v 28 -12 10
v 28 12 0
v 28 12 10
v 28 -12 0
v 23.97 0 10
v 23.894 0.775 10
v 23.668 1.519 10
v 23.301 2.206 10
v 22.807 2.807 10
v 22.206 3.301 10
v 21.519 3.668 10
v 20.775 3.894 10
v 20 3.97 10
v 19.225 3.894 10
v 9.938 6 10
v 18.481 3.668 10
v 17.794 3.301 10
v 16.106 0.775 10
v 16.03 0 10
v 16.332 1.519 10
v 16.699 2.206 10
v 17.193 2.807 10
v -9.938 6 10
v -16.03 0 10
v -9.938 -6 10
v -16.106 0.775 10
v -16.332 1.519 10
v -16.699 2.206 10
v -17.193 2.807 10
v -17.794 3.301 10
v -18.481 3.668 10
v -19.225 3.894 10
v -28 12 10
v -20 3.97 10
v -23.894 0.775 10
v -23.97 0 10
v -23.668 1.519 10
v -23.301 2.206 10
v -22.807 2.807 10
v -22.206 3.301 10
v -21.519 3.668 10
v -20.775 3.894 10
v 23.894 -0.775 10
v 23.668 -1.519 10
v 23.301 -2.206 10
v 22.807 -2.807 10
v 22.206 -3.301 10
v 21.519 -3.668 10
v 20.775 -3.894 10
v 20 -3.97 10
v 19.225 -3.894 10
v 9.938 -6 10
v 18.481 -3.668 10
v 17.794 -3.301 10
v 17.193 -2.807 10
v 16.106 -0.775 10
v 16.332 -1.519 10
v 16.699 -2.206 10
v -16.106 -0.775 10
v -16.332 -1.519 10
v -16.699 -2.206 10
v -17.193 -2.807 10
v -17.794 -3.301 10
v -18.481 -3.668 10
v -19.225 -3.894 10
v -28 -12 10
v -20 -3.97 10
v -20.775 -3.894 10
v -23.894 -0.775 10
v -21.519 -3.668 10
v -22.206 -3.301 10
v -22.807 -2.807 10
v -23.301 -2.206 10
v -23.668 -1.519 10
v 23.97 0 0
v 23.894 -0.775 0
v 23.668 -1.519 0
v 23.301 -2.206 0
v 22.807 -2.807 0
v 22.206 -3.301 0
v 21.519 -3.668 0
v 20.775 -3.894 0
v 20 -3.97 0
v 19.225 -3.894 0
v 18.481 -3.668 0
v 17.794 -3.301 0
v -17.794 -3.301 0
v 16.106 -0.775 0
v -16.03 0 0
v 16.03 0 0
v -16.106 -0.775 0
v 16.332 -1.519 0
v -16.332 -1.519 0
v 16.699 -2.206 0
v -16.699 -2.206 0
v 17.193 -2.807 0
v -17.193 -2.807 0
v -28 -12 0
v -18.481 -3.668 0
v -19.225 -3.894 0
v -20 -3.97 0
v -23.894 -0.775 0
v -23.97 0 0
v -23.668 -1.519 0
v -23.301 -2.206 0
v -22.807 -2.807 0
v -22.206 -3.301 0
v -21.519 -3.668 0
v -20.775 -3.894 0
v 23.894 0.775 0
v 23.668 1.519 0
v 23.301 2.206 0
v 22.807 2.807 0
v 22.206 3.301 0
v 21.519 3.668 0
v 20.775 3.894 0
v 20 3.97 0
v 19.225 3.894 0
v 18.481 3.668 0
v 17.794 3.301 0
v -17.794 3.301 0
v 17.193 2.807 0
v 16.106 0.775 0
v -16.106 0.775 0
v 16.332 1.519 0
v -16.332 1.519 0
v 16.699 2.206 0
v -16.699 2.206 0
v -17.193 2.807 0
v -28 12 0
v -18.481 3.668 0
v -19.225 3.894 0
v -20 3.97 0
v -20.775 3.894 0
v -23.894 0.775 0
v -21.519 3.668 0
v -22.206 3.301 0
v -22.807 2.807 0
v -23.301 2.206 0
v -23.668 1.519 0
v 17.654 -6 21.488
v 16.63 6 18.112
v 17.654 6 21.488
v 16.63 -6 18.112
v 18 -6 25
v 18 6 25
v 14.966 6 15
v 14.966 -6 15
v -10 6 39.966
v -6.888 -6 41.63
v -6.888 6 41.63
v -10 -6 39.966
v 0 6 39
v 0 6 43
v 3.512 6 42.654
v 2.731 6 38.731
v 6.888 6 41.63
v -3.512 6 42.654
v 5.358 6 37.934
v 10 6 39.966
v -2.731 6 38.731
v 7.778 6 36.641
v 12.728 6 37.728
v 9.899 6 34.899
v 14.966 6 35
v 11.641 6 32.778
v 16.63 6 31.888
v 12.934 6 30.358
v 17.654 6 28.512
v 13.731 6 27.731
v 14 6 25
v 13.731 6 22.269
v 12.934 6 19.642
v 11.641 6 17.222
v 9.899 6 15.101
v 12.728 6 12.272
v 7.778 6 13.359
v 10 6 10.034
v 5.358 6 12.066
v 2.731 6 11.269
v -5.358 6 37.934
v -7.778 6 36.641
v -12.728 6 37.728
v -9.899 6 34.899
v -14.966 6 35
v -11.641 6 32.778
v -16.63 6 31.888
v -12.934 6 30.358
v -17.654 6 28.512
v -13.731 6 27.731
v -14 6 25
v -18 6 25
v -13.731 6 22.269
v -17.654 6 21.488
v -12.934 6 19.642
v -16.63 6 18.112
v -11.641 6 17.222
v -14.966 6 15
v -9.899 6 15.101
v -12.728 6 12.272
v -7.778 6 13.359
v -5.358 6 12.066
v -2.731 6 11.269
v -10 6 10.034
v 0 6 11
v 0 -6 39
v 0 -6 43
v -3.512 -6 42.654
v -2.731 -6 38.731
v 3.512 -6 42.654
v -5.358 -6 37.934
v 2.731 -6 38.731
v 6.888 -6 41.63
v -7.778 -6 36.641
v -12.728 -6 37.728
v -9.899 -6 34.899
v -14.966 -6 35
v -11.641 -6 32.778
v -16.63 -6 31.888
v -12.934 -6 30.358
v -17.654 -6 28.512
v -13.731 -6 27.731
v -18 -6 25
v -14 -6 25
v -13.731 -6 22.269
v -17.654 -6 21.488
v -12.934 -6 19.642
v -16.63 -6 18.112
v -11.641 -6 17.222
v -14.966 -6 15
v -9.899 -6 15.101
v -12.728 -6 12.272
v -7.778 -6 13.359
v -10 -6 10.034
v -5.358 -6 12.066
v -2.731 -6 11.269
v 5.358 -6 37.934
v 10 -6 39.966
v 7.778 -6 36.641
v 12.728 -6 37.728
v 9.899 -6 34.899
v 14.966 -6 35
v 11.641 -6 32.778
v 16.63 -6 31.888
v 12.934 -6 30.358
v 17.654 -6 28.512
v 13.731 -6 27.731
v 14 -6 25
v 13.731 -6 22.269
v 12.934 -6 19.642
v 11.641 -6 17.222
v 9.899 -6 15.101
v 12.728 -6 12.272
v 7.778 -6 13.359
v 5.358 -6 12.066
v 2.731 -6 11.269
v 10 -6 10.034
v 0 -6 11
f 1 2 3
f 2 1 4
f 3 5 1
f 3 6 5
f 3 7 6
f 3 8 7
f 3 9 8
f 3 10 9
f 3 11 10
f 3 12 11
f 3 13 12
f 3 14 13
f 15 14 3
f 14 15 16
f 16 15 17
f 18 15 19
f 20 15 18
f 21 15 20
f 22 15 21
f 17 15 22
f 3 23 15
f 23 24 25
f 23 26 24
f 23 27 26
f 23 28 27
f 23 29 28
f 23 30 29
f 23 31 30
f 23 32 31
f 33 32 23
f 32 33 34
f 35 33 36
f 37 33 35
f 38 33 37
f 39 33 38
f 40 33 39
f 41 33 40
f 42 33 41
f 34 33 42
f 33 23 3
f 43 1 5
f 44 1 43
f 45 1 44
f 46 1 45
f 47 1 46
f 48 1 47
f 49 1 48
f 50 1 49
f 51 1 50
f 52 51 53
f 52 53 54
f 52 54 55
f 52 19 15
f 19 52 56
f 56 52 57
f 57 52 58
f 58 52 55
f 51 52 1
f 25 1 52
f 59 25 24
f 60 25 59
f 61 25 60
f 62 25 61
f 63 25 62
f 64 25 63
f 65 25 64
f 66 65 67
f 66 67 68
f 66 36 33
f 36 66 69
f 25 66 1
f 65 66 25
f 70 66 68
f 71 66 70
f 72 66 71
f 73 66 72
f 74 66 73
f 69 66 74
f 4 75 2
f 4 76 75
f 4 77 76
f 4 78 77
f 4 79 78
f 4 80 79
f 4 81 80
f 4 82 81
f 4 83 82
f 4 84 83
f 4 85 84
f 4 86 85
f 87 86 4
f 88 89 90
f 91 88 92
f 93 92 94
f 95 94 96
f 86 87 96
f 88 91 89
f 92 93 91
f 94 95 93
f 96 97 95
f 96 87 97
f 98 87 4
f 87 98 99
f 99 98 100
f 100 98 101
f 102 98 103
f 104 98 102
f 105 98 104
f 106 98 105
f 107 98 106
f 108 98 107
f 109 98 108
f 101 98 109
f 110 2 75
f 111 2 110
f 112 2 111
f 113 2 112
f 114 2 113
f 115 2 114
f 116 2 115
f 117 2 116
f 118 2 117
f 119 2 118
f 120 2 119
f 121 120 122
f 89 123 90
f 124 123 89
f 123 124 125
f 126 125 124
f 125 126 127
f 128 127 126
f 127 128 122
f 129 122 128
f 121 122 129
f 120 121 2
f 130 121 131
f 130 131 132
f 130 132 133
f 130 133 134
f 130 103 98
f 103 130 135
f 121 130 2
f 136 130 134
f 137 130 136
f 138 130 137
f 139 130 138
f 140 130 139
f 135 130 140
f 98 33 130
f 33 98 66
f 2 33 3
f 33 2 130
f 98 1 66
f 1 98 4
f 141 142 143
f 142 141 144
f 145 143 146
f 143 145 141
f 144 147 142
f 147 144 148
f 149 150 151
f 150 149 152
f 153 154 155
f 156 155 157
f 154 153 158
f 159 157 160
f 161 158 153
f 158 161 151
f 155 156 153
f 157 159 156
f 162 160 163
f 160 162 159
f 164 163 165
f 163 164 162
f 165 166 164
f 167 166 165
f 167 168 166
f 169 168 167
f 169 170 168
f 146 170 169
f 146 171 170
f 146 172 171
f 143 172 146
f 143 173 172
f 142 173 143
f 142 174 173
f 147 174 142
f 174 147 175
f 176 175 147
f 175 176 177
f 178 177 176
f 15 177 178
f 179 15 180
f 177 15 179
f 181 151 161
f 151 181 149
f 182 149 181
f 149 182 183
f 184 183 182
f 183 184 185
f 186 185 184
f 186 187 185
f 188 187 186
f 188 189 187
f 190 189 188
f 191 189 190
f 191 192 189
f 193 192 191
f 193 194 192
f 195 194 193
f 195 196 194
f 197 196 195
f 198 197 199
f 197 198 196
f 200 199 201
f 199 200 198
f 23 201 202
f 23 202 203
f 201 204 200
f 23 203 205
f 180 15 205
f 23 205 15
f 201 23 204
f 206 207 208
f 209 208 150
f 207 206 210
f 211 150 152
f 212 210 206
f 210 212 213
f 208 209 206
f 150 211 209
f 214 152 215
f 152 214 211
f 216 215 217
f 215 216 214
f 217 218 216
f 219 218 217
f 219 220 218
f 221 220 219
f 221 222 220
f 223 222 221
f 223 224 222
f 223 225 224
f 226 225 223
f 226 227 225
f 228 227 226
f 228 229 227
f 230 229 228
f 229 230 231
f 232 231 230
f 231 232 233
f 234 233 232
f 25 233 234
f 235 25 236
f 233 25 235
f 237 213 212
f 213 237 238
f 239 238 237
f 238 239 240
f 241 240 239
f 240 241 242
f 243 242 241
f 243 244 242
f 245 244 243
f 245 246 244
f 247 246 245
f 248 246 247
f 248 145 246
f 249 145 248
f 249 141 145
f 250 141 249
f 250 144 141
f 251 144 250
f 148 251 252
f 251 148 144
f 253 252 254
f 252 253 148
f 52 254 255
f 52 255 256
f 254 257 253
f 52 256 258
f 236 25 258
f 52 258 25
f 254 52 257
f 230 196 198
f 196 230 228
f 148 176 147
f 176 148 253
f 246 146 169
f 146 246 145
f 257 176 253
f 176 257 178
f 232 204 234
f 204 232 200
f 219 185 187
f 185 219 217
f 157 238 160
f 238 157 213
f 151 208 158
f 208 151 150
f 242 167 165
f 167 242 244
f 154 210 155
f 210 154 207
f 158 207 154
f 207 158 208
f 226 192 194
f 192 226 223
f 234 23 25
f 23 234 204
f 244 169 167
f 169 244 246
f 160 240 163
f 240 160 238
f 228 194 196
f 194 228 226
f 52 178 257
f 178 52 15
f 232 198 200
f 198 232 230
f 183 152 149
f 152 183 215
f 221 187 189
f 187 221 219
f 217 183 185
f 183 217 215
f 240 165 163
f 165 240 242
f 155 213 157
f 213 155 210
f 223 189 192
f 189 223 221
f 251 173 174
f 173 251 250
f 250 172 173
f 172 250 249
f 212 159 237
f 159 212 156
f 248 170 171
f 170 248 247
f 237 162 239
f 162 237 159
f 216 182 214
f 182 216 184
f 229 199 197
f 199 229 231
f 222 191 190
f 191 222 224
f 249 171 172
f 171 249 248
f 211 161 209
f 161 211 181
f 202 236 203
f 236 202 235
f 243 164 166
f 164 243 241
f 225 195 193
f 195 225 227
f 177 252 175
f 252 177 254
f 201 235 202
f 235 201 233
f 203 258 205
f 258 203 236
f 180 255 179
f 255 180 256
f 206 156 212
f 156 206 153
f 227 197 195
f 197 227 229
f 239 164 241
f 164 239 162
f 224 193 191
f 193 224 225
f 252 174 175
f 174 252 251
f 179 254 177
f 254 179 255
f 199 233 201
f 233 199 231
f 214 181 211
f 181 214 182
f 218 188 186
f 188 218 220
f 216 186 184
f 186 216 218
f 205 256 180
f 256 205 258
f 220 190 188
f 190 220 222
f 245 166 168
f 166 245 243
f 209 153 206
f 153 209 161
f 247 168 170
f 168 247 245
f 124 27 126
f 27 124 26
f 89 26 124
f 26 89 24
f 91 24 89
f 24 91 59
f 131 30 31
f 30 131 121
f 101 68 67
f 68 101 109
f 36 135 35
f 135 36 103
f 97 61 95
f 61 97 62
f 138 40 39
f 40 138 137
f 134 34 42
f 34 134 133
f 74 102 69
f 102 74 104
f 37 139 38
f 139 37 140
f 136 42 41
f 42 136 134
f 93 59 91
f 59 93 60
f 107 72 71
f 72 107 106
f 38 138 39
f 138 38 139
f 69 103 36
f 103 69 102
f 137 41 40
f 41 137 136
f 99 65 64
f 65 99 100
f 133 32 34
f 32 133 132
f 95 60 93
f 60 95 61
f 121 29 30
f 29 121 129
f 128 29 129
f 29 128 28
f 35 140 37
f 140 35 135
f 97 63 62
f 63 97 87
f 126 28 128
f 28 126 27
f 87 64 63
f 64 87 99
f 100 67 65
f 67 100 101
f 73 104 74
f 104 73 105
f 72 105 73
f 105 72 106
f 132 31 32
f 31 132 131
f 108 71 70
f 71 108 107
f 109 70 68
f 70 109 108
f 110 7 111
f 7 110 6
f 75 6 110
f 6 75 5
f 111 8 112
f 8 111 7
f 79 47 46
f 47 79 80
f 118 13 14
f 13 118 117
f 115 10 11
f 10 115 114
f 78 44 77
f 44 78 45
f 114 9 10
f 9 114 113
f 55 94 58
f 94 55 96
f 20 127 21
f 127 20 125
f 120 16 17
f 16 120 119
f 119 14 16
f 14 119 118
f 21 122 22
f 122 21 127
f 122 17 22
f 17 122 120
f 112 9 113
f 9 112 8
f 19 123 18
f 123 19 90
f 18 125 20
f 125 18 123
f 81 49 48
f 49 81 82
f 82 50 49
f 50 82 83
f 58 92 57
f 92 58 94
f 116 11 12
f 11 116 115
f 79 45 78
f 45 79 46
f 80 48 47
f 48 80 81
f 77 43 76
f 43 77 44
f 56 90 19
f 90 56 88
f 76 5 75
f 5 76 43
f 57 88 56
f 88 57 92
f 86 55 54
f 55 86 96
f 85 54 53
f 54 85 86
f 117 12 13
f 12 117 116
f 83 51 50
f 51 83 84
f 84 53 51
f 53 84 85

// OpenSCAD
$fn = 32;

// ----------------------------------------------------------------------
// Deck eye: 36 mm eye on a 56 mm base
// ----------------------------------------------------------------------

// --- parameters (mm) ---
base_l = 56;              // base length
base_w = 24;              // base width
base_t = 10;              // base thickness
eye_r = 18;               // eye outside radius
eye_bore = 28;            // eye bore diameter
eye_w = 12;               // eye thickness
eye_z = 25;               // eye centre height
holes_d = 7.94;           // fixing holes
hole_x = 20;              // fixing hole spacing

difference() {
  union() {
    translate([-28, -12, 0]) cube([base_l, base_w, base_t]);
    /* eye standing upright, its foot sunk 3 mm into the base */
    translate([0, -6, 25]) rotate([-90, 0, 0]) cylinder(h = 12, d = 36);
  }
  /* eye bore, 2.5 mm clear of both faces */
  translate([0, -8.5, 25]) rotate([-90, 0, 0]) cylinder(h = 17, d = 28);
  translate([-20, 0, -2.5]) cylinder(h = base_t + 5, d = holes_d);
  translate([20, 0, -2.5]) cylinder(h = base_t + 5, d = holes_d);
}
